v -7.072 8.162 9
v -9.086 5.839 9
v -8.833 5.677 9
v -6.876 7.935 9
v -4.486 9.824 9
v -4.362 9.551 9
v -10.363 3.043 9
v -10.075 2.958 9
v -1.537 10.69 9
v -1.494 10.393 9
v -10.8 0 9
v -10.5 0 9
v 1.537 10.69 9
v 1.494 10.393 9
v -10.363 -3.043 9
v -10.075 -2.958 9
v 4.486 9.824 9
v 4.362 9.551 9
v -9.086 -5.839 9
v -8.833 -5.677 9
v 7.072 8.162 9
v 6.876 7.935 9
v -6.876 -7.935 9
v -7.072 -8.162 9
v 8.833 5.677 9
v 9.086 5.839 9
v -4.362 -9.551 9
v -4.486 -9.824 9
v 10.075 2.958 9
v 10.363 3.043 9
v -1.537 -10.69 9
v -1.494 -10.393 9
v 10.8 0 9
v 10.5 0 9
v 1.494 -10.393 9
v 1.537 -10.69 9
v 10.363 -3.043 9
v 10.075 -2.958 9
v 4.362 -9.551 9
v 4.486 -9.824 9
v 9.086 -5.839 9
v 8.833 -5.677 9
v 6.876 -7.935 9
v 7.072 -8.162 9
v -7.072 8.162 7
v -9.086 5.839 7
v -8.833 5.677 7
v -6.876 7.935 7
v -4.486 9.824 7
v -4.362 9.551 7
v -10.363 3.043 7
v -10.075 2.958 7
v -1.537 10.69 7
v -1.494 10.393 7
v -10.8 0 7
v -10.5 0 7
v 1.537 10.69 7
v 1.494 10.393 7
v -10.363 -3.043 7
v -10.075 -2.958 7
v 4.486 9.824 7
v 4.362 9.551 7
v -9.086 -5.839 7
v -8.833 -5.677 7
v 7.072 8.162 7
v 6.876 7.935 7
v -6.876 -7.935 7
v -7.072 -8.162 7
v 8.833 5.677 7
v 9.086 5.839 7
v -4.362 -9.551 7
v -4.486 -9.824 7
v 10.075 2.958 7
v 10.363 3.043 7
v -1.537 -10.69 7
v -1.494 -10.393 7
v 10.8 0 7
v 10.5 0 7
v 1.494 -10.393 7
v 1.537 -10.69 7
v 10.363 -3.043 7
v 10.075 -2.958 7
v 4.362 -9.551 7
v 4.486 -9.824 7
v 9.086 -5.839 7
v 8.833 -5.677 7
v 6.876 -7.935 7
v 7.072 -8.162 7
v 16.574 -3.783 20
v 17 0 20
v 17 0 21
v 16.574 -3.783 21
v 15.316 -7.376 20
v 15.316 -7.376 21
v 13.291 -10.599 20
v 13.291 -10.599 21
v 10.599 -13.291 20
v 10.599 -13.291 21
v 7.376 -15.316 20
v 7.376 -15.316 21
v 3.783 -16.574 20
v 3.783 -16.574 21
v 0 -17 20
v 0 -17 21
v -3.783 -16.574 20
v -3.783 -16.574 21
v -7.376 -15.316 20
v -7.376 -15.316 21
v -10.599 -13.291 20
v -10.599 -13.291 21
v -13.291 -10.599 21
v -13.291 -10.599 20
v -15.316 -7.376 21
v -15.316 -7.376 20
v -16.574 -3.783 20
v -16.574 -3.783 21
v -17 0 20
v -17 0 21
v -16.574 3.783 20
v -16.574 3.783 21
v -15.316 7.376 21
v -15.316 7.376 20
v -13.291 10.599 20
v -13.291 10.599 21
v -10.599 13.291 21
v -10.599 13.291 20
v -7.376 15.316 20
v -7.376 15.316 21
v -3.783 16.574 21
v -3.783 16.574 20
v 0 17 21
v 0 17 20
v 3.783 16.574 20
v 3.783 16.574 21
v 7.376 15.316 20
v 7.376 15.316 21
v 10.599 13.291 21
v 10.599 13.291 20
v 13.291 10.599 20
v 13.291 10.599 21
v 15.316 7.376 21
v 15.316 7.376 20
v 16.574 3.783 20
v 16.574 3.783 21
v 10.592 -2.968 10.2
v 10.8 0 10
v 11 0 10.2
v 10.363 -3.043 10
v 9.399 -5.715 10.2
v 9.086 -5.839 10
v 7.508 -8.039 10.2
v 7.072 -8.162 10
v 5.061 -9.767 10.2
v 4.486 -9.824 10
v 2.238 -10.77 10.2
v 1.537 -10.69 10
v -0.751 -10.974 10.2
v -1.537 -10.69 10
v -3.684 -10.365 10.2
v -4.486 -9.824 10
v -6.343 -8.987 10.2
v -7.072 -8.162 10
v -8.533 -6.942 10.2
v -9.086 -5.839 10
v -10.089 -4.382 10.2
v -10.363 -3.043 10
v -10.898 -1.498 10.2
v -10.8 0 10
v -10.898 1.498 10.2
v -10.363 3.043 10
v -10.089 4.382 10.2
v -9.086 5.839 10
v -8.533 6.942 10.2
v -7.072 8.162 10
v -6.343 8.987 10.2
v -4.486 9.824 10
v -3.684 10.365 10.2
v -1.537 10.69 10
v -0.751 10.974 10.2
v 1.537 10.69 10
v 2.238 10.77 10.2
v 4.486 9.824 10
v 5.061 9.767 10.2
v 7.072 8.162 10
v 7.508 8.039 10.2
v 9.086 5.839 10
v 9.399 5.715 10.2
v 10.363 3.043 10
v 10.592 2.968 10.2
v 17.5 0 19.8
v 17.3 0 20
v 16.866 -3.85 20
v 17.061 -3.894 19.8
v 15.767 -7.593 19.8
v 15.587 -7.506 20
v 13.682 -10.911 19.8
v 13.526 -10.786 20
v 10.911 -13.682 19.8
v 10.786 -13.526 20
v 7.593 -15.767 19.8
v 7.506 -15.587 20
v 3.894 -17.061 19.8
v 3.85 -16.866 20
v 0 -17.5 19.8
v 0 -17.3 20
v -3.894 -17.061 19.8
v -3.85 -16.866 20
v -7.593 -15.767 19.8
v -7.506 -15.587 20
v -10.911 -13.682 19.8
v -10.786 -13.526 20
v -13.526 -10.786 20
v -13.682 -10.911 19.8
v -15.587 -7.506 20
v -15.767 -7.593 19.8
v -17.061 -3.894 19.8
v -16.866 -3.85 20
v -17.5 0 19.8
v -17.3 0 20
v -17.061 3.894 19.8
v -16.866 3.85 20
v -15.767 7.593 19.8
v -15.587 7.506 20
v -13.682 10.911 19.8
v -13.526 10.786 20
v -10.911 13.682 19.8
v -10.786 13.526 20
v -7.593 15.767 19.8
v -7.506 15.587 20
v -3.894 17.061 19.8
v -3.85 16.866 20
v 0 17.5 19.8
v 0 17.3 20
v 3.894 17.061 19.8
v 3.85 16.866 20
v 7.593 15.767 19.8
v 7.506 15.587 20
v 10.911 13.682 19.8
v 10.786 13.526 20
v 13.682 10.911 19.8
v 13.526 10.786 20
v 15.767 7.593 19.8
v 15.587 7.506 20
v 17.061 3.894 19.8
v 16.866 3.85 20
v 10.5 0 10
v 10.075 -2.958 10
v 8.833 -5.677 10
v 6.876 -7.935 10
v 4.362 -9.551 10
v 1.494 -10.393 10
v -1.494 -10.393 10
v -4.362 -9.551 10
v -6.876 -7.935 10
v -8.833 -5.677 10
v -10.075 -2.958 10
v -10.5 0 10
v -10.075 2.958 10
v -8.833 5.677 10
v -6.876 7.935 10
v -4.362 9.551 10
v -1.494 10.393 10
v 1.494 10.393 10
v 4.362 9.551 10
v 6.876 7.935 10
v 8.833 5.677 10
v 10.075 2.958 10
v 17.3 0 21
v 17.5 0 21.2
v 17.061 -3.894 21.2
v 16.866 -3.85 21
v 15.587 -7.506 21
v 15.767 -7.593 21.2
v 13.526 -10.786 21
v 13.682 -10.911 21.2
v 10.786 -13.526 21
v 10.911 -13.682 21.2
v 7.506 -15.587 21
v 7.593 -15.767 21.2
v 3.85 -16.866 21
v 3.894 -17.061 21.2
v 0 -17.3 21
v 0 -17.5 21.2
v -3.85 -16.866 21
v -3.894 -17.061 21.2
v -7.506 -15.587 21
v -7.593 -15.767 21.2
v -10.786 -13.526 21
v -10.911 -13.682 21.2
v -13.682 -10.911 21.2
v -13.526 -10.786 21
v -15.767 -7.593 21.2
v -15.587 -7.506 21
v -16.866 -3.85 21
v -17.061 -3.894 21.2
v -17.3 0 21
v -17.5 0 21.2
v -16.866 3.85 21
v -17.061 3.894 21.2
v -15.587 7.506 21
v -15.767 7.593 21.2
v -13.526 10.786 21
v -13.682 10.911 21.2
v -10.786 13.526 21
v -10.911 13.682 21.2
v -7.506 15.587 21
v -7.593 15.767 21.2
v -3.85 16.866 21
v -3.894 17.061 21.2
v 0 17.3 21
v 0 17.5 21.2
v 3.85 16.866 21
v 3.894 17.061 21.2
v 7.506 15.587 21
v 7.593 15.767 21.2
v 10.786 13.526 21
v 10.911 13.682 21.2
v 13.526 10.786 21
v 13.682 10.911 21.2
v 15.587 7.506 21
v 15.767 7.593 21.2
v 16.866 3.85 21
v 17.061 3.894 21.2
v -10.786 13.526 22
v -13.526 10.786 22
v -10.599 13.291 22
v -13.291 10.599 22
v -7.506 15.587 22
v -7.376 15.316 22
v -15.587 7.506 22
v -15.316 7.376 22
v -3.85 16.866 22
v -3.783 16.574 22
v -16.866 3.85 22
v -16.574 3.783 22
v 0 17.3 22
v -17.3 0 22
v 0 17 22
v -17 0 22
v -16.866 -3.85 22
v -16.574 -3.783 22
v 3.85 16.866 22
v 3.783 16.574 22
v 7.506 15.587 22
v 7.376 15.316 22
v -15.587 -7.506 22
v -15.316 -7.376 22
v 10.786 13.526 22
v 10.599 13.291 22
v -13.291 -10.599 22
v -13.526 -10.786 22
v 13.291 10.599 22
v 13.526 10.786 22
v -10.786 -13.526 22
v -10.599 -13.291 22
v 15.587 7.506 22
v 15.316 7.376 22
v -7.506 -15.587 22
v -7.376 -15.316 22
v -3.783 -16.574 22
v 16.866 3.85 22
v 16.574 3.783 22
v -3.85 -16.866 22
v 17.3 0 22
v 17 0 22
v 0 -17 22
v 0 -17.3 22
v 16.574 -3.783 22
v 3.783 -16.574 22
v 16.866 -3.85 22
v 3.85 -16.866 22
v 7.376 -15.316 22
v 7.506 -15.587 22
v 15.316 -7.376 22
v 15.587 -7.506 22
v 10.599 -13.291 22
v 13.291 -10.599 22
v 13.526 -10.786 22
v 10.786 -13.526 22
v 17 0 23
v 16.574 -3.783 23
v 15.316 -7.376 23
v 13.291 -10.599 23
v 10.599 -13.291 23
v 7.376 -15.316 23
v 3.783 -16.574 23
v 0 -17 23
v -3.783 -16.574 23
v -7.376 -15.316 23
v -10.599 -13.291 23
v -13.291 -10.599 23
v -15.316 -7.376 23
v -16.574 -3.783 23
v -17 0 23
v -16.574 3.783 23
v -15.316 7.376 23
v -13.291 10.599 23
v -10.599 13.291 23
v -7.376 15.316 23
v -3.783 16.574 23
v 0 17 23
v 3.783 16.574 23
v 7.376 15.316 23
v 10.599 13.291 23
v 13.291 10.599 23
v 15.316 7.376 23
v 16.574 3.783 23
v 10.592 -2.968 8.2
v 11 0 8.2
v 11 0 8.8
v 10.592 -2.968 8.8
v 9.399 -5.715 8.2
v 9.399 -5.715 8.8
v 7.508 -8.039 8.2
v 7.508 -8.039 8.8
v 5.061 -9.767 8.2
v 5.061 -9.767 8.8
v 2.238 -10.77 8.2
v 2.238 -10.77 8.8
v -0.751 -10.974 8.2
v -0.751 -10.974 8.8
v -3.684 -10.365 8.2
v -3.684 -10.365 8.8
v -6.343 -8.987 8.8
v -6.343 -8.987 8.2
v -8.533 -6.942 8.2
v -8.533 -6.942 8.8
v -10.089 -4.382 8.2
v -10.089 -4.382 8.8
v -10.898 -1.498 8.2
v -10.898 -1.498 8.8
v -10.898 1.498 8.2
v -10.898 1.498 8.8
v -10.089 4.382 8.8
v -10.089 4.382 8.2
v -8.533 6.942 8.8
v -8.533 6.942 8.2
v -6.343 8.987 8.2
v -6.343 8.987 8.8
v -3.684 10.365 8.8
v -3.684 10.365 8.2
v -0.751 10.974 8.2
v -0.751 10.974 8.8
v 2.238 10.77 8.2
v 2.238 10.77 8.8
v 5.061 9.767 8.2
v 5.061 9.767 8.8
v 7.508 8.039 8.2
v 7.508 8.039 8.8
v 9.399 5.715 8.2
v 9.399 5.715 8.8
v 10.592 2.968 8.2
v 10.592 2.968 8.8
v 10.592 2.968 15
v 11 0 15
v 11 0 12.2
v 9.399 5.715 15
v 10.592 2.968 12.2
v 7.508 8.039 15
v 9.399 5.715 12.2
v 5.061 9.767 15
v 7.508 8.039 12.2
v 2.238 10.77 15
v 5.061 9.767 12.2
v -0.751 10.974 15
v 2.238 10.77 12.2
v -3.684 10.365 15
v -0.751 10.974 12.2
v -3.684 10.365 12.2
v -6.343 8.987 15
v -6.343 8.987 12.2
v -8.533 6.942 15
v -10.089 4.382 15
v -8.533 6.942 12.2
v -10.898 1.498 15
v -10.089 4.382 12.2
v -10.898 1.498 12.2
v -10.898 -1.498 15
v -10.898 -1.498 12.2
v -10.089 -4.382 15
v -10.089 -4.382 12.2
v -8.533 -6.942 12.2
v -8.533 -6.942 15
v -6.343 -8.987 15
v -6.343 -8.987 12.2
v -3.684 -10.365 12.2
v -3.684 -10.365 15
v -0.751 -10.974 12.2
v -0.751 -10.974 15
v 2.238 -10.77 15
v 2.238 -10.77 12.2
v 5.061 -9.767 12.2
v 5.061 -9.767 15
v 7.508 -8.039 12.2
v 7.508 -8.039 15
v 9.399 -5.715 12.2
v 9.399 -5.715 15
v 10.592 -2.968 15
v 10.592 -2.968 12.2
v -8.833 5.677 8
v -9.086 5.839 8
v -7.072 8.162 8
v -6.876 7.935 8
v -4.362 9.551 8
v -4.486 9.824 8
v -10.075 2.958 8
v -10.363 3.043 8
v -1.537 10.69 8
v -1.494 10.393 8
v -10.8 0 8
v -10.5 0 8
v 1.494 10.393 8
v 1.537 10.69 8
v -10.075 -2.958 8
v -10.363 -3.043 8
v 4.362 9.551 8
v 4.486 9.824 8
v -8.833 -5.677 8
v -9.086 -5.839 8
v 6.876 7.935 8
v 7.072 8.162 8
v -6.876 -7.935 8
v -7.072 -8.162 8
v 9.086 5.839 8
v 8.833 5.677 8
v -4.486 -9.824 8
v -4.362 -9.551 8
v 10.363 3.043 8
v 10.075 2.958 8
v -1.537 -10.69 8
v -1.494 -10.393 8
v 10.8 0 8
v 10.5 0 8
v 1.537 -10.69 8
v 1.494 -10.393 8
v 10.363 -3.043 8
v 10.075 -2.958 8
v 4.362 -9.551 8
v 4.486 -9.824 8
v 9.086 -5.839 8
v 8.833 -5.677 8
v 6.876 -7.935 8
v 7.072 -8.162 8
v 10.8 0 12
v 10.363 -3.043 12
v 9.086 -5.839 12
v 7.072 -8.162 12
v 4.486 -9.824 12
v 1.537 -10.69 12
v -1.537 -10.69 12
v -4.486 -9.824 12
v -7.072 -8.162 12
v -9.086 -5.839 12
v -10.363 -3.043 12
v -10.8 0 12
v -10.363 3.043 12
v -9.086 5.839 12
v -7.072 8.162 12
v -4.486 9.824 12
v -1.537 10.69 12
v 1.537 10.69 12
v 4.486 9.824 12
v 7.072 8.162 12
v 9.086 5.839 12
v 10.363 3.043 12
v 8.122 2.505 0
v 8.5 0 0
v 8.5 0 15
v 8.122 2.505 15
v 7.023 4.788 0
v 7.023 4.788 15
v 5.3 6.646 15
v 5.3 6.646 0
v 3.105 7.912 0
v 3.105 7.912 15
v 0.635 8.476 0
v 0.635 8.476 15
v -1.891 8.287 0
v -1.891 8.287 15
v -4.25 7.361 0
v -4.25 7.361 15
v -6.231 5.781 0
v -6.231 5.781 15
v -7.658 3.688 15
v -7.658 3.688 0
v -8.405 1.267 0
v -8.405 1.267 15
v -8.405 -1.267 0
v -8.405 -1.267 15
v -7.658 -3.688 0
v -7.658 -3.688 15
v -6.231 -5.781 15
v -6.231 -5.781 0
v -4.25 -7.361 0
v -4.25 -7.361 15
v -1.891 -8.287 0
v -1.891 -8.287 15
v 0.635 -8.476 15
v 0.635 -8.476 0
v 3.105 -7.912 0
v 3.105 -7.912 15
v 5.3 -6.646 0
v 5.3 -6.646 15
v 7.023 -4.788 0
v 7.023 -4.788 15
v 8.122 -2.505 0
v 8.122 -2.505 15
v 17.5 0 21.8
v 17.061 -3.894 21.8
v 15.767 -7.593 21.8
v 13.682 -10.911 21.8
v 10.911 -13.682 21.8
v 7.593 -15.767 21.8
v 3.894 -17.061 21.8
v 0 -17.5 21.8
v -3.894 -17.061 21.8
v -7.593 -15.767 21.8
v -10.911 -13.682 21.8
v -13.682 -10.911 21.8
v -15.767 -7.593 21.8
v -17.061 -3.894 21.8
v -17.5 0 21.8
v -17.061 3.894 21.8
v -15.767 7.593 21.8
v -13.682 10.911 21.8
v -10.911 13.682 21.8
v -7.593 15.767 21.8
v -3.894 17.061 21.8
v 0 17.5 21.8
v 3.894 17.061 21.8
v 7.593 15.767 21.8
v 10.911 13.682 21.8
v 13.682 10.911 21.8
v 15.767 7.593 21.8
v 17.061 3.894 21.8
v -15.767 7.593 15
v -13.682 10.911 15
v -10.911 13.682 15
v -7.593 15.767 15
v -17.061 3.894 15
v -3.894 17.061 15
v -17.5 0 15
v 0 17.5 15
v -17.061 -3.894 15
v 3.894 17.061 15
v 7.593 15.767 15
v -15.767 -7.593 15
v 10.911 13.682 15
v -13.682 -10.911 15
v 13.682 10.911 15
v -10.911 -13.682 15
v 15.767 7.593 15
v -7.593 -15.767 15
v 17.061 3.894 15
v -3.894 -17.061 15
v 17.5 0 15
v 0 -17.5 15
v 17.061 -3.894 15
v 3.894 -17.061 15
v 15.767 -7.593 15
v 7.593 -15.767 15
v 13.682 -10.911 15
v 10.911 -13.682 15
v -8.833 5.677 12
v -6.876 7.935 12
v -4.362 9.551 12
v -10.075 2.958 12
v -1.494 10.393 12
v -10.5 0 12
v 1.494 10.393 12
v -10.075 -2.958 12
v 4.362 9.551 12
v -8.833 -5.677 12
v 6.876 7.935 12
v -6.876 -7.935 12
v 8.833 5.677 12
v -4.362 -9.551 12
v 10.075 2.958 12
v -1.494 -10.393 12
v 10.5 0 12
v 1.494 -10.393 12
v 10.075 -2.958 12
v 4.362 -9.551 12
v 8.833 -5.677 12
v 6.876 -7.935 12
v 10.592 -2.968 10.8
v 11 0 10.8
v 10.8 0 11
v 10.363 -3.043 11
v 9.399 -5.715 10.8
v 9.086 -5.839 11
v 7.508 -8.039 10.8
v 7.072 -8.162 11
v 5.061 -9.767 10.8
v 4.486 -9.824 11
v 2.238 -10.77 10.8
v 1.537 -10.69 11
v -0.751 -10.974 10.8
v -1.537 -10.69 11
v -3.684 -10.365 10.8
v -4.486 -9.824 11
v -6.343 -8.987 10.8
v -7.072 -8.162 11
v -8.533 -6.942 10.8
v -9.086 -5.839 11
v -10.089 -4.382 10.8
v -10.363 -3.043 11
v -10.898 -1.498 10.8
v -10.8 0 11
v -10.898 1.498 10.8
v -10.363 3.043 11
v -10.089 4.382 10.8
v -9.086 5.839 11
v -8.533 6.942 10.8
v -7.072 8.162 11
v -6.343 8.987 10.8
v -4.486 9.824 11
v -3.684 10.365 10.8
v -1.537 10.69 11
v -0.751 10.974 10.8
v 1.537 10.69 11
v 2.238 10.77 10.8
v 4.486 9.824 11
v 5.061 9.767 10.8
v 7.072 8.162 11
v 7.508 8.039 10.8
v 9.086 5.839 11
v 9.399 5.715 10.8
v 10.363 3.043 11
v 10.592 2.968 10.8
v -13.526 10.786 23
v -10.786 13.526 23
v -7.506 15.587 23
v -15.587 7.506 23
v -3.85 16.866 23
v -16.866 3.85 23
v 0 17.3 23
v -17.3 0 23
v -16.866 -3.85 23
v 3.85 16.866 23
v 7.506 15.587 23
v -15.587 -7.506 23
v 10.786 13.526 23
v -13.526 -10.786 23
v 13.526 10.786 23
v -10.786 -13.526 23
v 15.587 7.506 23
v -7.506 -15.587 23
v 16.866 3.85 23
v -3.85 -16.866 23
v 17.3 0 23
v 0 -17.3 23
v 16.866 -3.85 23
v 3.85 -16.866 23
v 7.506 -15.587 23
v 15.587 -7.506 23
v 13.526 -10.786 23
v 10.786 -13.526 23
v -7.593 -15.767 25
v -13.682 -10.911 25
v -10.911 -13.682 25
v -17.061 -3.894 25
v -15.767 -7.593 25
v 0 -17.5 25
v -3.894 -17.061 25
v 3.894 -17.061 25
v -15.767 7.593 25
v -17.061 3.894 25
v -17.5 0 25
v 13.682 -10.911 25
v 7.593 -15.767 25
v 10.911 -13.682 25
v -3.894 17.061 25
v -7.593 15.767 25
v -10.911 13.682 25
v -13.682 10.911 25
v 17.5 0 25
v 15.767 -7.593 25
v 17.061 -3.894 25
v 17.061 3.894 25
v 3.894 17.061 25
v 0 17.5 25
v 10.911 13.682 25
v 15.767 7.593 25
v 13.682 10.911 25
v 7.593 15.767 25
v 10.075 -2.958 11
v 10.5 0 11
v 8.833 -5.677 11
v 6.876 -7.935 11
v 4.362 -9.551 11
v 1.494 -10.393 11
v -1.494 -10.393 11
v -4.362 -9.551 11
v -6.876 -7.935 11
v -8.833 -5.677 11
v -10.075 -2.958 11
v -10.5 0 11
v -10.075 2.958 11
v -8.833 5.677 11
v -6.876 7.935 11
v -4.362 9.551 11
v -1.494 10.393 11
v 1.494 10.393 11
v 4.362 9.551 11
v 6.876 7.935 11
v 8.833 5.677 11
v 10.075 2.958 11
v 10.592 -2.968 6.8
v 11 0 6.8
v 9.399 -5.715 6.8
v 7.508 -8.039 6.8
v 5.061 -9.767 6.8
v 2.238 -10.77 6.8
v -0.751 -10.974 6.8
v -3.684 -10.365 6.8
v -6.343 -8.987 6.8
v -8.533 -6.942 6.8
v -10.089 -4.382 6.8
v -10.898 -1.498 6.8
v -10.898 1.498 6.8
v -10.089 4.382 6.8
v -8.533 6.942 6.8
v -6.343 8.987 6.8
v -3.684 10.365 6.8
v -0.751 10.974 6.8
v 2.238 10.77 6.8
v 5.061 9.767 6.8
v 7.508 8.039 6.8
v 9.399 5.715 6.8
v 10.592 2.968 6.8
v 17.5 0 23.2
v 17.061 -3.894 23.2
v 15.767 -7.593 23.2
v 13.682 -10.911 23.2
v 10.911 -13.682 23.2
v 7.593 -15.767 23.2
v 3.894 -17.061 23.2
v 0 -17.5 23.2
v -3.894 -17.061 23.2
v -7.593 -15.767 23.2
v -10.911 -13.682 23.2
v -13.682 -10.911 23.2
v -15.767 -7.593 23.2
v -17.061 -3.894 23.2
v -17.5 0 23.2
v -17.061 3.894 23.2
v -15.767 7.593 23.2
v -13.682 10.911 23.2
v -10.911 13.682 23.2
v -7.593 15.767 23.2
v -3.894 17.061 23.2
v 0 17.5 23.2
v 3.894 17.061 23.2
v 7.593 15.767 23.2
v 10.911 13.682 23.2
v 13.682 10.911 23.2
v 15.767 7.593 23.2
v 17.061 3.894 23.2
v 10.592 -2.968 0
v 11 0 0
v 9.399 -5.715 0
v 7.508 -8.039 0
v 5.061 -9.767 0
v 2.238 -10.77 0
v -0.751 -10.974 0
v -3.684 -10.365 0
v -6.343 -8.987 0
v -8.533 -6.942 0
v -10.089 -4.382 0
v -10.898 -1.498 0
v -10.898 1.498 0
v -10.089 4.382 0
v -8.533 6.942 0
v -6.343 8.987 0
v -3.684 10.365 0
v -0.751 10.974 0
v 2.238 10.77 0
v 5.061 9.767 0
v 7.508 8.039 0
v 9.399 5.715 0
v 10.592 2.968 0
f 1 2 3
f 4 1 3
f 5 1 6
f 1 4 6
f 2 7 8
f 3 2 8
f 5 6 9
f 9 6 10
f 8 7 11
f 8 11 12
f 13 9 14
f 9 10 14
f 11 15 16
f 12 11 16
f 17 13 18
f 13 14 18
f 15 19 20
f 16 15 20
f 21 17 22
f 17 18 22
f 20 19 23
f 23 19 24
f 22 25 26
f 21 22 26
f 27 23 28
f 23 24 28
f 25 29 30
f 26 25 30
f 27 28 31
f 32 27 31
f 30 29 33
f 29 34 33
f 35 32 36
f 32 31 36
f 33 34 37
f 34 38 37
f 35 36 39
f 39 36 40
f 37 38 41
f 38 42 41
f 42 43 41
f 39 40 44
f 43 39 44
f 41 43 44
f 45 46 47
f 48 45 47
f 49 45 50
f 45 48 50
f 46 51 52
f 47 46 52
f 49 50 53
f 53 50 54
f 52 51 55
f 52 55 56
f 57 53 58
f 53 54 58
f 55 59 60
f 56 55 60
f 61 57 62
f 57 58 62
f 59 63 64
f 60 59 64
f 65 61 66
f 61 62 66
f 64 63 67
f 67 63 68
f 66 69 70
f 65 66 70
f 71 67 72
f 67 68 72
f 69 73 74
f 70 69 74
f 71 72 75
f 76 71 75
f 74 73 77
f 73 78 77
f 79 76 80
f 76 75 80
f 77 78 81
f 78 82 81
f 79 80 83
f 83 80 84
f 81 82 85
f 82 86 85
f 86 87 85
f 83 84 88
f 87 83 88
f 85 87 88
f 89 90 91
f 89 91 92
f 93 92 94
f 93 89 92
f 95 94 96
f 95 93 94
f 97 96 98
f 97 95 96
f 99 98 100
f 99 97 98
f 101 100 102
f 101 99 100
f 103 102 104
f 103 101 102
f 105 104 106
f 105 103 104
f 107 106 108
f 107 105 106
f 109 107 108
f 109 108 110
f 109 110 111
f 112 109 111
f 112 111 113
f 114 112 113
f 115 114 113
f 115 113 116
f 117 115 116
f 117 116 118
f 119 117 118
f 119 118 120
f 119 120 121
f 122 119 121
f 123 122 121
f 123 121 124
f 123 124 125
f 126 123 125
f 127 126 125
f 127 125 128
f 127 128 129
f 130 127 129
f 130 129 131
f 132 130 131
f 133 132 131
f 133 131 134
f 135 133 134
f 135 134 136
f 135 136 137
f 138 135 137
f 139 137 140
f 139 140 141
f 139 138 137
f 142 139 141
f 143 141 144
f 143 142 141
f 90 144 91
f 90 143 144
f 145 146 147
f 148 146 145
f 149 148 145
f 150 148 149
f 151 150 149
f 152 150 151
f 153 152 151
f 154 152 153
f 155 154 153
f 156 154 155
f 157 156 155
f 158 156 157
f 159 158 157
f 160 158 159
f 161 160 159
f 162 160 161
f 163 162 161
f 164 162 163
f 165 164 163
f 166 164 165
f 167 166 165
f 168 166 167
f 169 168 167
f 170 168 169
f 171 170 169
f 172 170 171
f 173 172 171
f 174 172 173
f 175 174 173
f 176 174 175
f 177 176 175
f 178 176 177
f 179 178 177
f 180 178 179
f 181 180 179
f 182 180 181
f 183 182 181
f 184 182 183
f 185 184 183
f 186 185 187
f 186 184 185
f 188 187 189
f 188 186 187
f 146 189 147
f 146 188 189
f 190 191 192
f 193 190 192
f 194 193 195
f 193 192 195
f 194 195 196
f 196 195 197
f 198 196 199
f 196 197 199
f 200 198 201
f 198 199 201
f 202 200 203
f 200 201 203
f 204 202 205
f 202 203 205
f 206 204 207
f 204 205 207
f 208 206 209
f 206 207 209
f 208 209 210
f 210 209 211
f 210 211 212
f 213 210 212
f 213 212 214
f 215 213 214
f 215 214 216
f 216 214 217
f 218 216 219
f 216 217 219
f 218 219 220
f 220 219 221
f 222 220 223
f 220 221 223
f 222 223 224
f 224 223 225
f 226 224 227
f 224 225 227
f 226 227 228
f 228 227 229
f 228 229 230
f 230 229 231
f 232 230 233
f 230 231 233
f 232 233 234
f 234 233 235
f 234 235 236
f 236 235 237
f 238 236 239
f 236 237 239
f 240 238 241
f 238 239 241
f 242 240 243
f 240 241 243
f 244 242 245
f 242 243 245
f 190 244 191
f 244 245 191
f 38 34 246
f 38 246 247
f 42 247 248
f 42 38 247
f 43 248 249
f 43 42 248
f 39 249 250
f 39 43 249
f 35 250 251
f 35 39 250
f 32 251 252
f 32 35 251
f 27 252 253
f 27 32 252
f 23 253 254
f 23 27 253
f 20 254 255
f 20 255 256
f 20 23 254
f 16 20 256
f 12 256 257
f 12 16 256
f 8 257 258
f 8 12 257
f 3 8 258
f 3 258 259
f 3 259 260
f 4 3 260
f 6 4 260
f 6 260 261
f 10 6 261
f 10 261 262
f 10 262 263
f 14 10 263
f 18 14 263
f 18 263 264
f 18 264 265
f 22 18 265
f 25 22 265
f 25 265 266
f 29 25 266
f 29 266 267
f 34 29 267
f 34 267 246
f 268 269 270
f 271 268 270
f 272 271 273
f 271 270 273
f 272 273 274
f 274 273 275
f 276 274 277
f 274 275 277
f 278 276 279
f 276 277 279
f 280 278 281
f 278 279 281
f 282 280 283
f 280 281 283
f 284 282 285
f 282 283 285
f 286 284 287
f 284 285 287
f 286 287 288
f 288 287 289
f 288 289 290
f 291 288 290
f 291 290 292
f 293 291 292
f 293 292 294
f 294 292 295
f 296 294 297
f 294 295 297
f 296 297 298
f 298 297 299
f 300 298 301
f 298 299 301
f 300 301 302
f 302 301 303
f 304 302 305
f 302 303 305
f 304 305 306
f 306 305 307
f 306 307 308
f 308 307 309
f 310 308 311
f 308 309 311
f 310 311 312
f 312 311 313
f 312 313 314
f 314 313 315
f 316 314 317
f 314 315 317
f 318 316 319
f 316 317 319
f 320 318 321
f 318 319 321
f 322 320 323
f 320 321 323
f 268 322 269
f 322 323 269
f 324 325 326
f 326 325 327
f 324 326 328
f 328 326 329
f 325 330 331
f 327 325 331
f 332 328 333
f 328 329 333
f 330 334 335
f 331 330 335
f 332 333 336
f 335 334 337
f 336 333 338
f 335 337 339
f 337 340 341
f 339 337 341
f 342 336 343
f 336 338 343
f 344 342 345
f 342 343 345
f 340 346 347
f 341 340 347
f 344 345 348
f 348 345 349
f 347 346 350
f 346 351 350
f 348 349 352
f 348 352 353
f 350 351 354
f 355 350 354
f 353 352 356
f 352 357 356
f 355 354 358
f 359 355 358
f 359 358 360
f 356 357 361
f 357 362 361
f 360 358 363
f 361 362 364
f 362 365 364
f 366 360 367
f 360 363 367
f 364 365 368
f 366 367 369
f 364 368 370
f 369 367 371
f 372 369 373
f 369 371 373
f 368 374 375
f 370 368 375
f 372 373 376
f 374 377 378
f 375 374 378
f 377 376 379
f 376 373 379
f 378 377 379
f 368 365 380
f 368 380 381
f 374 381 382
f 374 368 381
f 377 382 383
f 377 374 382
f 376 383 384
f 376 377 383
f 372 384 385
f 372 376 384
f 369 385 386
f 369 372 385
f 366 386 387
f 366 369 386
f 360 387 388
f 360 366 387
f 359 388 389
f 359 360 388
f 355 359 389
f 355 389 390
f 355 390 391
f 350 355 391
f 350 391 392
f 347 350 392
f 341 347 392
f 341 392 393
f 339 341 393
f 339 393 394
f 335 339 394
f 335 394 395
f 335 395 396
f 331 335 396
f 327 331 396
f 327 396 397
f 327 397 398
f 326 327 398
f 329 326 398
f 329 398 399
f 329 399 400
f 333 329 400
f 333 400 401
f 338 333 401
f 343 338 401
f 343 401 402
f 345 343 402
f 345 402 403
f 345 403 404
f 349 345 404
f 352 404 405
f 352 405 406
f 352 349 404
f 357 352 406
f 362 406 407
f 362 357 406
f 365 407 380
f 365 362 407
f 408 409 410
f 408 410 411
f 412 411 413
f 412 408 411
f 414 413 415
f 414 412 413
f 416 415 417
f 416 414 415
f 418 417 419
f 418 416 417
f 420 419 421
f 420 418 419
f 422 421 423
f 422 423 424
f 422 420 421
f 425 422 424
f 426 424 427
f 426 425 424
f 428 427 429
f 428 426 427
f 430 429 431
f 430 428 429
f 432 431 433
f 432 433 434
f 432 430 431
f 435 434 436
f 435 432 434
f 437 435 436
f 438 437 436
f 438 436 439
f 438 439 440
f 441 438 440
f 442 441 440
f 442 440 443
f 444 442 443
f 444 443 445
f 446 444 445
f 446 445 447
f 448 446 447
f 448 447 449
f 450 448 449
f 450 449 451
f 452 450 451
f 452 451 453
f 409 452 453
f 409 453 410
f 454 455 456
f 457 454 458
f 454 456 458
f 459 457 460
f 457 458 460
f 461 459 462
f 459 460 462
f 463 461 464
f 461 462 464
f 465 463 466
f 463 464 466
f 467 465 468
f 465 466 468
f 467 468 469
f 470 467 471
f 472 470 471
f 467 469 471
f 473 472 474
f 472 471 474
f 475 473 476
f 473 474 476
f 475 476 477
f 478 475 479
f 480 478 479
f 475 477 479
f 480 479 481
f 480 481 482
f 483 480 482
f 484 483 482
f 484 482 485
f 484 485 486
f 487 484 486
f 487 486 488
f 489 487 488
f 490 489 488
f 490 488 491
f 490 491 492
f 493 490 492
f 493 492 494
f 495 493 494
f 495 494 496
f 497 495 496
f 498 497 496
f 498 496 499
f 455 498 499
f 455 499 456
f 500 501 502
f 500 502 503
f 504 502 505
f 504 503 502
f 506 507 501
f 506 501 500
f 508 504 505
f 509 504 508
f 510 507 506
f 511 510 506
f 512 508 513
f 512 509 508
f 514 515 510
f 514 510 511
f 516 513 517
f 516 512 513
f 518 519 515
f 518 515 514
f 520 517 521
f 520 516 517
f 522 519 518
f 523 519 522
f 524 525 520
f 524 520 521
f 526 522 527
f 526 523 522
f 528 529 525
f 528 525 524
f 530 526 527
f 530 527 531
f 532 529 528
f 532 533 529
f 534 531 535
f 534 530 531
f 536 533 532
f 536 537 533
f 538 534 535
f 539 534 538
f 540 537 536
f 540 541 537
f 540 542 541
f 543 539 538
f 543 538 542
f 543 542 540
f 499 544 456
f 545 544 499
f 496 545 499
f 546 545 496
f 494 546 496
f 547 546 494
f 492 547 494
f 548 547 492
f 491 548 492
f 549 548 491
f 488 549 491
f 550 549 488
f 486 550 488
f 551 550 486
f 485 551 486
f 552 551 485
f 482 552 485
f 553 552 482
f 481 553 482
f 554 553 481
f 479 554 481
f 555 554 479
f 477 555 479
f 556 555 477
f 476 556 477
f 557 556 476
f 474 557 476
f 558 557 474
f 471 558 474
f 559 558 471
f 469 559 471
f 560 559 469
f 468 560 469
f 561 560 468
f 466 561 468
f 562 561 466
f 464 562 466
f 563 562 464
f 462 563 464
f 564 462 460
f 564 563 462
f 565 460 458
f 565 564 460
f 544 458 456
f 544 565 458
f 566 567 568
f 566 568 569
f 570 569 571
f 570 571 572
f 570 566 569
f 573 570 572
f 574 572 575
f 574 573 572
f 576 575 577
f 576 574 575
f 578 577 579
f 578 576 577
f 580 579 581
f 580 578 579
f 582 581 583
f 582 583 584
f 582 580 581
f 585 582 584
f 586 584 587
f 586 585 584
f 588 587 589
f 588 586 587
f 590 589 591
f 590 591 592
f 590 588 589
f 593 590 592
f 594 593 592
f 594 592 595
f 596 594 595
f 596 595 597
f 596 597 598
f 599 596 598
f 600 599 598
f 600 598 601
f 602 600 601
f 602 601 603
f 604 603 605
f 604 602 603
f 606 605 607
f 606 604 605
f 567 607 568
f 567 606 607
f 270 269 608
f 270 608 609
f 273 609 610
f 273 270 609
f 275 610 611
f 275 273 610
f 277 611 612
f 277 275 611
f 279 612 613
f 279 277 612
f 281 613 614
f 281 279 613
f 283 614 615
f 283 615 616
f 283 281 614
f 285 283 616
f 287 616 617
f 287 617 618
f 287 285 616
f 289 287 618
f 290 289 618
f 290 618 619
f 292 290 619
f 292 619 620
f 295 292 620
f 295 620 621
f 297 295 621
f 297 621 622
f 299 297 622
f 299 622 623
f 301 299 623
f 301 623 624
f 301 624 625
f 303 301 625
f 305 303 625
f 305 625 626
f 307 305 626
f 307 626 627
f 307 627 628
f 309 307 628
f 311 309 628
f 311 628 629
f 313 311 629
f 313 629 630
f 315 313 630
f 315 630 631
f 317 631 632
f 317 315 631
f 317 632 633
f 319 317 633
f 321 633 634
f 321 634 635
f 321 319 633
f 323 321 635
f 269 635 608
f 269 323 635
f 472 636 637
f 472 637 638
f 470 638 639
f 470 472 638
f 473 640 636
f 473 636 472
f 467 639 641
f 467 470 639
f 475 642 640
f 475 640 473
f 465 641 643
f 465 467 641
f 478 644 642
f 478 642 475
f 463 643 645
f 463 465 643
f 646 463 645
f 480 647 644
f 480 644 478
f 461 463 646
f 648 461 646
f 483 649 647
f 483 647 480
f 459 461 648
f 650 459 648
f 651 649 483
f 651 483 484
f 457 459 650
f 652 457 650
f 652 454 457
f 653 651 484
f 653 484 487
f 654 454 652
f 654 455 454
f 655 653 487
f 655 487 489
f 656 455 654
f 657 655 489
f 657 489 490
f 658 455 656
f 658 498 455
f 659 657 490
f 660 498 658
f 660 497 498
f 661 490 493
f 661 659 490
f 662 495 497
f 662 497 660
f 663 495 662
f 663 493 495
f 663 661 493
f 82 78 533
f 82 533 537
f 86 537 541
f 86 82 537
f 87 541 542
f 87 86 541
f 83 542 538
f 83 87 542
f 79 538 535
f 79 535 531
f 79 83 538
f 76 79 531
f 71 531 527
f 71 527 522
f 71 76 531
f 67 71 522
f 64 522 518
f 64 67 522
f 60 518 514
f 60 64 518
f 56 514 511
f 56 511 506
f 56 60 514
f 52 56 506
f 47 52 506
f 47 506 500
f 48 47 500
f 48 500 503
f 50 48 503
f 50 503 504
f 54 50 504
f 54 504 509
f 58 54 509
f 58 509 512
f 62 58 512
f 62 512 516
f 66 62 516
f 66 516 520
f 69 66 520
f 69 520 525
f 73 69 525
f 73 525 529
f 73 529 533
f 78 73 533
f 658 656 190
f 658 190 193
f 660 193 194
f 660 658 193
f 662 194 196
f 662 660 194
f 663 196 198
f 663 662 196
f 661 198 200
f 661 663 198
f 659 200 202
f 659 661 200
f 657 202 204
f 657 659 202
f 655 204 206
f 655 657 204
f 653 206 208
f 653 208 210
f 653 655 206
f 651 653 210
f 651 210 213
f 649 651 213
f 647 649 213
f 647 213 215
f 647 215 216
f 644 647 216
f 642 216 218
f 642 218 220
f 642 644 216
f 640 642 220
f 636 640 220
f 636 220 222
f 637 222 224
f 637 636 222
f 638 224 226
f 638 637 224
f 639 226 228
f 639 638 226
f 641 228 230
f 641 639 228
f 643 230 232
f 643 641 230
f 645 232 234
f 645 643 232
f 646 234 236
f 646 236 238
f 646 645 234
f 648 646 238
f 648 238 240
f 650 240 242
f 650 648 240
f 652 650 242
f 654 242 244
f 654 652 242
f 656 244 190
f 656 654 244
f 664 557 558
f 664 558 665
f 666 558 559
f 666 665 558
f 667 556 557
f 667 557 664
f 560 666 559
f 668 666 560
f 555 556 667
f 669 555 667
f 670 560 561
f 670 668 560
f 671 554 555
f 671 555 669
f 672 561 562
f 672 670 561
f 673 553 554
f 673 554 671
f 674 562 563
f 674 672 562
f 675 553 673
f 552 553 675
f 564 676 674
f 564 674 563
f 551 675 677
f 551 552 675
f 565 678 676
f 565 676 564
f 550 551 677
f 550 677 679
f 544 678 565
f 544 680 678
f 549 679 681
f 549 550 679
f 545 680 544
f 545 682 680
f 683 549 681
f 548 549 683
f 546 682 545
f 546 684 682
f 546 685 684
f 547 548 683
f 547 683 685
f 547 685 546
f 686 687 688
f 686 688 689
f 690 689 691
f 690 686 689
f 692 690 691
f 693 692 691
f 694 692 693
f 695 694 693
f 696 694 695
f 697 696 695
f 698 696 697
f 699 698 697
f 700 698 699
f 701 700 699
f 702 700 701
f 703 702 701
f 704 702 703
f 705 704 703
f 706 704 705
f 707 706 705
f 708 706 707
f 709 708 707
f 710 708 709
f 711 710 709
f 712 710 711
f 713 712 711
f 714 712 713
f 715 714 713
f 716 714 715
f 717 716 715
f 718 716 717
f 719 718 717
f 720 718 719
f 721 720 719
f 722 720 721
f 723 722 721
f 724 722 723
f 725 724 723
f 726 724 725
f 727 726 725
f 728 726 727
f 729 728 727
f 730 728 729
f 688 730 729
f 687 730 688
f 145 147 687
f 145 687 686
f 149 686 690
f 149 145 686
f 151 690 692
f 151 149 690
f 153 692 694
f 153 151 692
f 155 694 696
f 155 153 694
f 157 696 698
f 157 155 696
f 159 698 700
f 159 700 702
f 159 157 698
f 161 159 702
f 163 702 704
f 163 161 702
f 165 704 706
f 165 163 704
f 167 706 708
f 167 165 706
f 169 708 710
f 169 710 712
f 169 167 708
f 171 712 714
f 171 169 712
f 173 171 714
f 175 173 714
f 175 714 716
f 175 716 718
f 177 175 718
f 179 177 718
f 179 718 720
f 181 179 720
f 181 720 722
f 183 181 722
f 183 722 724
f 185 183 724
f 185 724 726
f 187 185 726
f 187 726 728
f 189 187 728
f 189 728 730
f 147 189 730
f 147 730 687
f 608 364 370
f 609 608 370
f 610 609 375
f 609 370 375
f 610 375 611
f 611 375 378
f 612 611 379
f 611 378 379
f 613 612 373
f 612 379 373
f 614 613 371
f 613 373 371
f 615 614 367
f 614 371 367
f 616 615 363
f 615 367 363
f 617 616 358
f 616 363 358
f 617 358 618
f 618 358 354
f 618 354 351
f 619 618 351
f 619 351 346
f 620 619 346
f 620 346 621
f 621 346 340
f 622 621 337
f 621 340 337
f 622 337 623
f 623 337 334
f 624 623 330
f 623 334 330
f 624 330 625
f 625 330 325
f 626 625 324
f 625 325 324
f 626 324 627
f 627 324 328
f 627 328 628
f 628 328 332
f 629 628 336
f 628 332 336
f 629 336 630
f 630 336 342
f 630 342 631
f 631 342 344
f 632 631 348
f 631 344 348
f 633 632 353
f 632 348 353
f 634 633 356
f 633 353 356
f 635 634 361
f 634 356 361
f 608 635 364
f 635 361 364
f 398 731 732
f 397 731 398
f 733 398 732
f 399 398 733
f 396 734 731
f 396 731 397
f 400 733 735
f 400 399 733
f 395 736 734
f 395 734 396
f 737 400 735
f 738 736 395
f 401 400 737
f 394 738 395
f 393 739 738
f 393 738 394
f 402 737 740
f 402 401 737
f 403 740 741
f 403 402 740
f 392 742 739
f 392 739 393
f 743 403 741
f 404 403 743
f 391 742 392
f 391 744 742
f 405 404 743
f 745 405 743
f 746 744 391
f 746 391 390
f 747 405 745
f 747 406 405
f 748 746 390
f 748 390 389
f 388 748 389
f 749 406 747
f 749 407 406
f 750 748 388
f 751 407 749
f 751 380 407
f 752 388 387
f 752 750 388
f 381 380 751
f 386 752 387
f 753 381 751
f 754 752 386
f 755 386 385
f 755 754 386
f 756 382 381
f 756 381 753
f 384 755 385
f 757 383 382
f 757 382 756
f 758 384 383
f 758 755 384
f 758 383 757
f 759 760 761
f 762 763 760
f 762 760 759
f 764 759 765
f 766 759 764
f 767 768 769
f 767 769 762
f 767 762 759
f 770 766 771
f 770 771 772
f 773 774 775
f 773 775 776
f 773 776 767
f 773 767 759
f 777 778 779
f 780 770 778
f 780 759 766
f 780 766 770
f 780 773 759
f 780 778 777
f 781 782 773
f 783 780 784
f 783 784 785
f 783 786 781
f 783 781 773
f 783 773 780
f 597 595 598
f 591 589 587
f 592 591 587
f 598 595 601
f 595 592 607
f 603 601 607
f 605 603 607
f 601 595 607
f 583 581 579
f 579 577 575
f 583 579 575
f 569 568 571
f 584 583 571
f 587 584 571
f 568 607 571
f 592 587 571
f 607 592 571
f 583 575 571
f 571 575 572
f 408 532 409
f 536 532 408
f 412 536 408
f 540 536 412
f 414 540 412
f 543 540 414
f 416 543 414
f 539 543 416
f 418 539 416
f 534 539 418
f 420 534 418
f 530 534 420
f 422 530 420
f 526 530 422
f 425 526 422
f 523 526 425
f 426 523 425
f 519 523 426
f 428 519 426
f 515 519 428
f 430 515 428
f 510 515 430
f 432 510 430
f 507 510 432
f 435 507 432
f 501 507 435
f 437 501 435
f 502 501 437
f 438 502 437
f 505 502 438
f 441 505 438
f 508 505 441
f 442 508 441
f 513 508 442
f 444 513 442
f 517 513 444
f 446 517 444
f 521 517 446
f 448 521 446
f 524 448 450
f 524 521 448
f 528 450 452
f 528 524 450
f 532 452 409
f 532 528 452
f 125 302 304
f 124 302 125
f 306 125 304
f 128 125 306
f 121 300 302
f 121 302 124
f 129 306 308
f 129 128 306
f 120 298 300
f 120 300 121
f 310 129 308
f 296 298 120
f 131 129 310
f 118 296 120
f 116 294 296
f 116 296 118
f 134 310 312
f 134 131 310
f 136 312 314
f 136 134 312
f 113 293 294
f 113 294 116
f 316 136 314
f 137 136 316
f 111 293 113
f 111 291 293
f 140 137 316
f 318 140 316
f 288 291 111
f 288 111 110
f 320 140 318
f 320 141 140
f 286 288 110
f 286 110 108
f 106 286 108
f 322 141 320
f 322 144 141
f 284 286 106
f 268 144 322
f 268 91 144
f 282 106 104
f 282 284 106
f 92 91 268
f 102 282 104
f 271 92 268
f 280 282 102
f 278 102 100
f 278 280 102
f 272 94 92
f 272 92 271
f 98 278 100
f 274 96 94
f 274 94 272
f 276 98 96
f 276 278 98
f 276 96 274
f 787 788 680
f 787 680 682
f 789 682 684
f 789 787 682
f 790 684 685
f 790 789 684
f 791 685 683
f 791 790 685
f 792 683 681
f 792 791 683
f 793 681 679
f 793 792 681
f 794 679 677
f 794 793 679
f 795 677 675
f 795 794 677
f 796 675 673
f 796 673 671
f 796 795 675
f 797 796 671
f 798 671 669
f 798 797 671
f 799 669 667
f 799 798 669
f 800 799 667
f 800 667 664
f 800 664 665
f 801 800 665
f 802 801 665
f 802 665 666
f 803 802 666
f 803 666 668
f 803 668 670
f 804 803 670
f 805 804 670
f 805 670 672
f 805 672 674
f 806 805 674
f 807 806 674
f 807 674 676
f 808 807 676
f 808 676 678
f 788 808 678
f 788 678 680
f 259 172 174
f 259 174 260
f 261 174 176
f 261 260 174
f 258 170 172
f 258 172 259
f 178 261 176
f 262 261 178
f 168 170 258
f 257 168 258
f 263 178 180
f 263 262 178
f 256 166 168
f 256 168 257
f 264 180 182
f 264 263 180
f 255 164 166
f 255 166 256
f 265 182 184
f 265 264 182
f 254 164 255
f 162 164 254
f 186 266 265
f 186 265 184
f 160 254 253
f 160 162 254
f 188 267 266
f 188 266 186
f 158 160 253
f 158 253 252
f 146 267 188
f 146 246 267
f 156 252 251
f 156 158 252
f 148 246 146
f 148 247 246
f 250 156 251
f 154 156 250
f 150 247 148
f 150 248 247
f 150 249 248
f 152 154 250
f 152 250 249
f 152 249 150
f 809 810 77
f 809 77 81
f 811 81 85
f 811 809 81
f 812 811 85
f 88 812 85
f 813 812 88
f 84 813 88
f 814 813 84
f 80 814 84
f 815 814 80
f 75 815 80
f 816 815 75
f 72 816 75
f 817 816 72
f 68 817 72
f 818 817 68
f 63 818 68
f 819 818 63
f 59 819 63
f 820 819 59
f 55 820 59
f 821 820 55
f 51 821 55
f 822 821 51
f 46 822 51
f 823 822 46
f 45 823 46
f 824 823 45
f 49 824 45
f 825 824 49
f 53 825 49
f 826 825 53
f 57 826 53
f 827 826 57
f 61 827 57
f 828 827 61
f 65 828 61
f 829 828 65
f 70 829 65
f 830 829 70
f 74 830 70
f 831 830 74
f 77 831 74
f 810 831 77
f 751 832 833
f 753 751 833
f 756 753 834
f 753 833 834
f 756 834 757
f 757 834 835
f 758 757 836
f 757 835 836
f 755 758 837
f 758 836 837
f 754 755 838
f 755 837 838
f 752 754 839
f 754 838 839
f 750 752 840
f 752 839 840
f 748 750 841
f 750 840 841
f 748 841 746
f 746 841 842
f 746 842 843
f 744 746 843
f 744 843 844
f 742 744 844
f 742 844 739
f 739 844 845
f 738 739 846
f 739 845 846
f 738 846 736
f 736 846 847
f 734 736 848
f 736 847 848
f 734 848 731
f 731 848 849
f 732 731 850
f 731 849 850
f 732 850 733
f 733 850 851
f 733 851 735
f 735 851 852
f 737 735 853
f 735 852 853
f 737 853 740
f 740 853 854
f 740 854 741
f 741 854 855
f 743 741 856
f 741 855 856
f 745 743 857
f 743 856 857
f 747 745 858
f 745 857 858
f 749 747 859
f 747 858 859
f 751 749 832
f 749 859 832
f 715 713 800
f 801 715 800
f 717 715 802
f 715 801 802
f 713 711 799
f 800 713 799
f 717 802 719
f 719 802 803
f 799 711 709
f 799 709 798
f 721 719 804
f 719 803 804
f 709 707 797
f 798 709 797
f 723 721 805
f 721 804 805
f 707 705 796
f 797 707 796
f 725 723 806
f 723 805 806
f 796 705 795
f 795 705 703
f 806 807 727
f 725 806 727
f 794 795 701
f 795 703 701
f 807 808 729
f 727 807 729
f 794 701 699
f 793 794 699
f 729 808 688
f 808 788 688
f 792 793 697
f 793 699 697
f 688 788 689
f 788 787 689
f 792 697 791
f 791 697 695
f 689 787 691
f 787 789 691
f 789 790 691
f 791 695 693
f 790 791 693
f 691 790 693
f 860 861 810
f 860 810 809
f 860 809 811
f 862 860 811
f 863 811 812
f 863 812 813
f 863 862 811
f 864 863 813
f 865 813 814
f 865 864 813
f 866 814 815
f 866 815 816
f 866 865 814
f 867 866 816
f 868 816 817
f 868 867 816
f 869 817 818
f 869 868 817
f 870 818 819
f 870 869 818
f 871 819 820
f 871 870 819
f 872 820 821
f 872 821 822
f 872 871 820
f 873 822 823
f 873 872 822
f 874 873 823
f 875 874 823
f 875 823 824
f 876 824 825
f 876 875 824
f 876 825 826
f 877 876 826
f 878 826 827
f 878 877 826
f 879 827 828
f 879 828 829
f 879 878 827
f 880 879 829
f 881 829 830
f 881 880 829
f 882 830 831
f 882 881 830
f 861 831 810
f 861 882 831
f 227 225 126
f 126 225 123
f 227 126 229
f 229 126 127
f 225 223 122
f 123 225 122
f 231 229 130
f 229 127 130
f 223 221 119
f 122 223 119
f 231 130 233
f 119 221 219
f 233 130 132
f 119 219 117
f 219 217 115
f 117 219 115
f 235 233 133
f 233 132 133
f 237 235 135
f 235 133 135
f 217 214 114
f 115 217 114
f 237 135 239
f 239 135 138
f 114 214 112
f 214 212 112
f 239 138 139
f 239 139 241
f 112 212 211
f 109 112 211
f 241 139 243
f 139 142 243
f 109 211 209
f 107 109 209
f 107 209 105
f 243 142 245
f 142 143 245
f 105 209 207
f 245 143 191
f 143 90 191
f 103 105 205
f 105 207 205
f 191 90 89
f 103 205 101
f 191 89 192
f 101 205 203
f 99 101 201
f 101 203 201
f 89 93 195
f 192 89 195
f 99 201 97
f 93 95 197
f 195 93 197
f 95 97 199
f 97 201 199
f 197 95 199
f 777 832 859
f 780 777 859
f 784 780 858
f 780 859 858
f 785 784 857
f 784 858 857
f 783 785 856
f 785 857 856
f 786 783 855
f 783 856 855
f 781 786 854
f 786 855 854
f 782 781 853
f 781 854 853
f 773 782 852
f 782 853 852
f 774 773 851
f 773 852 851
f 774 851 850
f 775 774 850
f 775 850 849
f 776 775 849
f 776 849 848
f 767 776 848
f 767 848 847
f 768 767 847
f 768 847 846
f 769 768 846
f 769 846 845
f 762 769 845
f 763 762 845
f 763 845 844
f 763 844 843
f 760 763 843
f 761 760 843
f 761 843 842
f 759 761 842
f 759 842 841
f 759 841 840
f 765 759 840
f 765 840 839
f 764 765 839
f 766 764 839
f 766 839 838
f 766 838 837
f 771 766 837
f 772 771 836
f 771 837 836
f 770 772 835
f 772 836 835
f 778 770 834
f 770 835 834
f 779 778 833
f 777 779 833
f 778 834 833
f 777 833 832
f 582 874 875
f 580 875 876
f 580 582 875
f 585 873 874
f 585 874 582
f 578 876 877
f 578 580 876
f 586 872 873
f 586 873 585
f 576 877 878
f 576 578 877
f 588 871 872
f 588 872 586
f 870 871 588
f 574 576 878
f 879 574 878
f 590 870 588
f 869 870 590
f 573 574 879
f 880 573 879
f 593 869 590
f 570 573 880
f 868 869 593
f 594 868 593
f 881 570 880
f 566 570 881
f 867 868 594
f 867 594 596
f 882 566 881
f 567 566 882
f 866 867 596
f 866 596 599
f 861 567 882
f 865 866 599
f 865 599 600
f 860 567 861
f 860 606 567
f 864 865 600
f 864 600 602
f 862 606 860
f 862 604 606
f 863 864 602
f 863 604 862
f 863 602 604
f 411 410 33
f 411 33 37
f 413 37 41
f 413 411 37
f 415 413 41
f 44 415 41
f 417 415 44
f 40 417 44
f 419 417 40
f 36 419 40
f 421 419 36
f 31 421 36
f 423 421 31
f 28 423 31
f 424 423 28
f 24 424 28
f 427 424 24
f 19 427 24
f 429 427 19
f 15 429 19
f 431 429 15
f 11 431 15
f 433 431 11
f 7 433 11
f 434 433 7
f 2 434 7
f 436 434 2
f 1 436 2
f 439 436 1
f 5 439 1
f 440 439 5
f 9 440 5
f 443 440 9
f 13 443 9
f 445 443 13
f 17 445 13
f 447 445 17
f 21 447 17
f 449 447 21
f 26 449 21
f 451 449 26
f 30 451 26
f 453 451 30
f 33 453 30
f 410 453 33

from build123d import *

# Parameters (mm, degrees)
F0_R      = 11
F0_R_2    = 8.5
F1_DEPTH  = 15
F2_R      = 17.5
F3_DEPTH  = 10
F4_R      = 11
F4_R_2    = 10.5
F5_DEPTH  = 12
F6_R      = 11
F6_R_2    = 10.5
F7_DEPTH  = 11
F8_R      = 11
F8_R_2    = 10.5
F9_DEPTH  = 10
F10_R     = 11
F10_R_2   = 10.5
F11_DEPTH = 9
F12_R     = 11
F12_R_2   = 10.5
F13_DEPTH = 8
F14_R     = 11
F14_R_2   = 10.5
F15_DEPTH = 7
F16_R     = 17.5
F16_R_2   = 17
F17_DEPTH = 8
F18_R     = 17.5
F18_R_2   = 17
F19_DEPTH = 7
F20_R     = 17.5
F20_R_2   = 17
F21_DEPTH = 6
F22_R     = 17.5
F22_R_2   = 17
F23_DEPTH = 5
F24_SIZE  = 0.2


with BuildPart() as f1:
    # F0 (on Top) → F1 (new body)
    with BuildSketch(Plane.XY):
        Circle(F0_R)
        Circle(F0_R_2, mode=Mode.SUBTRACT)
    extrude(amount=F1_DEPTH)

    # F2 (on face) → F3 (join)
    with BuildSketch(Plane.XY.offset(15)):
        Circle(F2_R)
    extrude(amount=F3_DEPTH)

    # F4 (on face) → F5 (cut)
    with BuildSketch(Plane(origin=(0, 0, 0), x_dir=(1, 0, 0), z_dir=(0, 0, -1))):
        Circle(F4_R)
        Circle(F4_R_2, mode=Mode.SUBTRACT)
    extrude(amount=-F5_DEPTH, mode=Mode.SUBTRACT)

    # F6 (on face) → F7 (join)
    with BuildSketch(Plane(origin=(0, 0, 0), x_dir=(1, 0, 0), z_dir=(0, 0, -1))):
        Circle(F6_R)
        Circle(F6_R_2, mode=Mode.SUBTRACT)
    extrude(amount=-F7_DEPTH)

    # F8 (on face) → F9 (cut)
    with BuildSketch(Plane(origin=(0, 0, 0), x_dir=(1, 0, 0), z_dir=(0, 0, -1))):
        Circle(F8_R)
        Circle(F8_R_2, mode=Mode.SUBTRACT)
    extrude(amount=-F9_DEPTH, mode=Mode.SUBTRACT)

    # F10 (on face) → F11 (join)
    with BuildSketch(Plane(origin=(0, 0, 0), x_dir=(1, 0, 0), z_dir=(0, 0, -1))):
        Circle(F10_R)
        Circle(F10_R_2, mode=Mode.SUBTRACT)
    extrude(amount=-F11_DEPTH)

    # F12 (on face) → F13 (cut)
    with BuildSketch(Plane(origin=(0, 0, 0), x_dir=(1, 0, 0), z_dir=(0, 0, -1))):
        Circle(F12_R)
        Circle(F12_R_2, mode=Mode.SUBTRACT)
    extrude(amount=-F13_DEPTH, mode=Mode.SUBTRACT)

    # F14 (on face) → F15 (join)
    with BuildSketch(Plane(origin=(0, 0, 0), x_dir=(1, 0, 0), z_dir=(0, 0, -1))):
        Circle(F14_R)
        Circle(F14_R_2, mode=Mode.SUBTRACT)
    extrude(amount=-F15_DEPTH)

    # F16 (on face) → F17 (cut)
    with BuildSketch(Plane(origin=(0, 0, 15), x_dir=(1, 0, 0), z_dir=(0, 0, -1))):
        Circle(F16_R)
        Circle(F16_R_2, mode=Mode.SUBTRACT)
    extrude(amount=-F17_DEPTH, mode=Mode.SUBTRACT)

    # F18 (on face) → F19 (join)
    with BuildSketch(Plane(origin=(0, 0, 15), x_dir=(1, 0, 0), z_dir=(0, 0, -1))):
        Circle(F18_R)
        Circle(F18_R_2, mode=Mode.SUBTRACT)
    extrude(amount=-F19_DEPTH)

    # F20 (on face) → F21 (cut)
    with BuildSketch(Plane(origin=(0, 0, 15), x_dir=(1, 0, 0), z_dir=(0, 0, -1))):
        Circle(F20_R)
        Circle(F20_R_2, mode=Mode.SUBTRACT)
    extrude(amount=-F21_DEPTH, mode=Mode.SUBTRACT)

    # F22 (on face) → F23 (join)
    with BuildSketch(Plane(origin=(0, 0, 15), x_dir=(1, 0, 0), z_dir=(0, 0, -1))):
        Circle(F22_R)
        Circle(F22_R_2, mode=Mode.SUBTRACT)
    extrude(amount=-F23_DEPTH)

    # F24
    f24_edges = [f1.edges().sort_by_distance(p)[0] for p in [
        (-17.5, 0, 23),
        (-17.5, 0, 22),
        (-17.5, 0, 20),
        (-17.5, 0, 21),
        (-11, 0, 12),
        (-11, 0, 10),
        (-11, 0, 11),
        (-11, 0, 9),
        (-11, 0, 8),
        (-11, 0, 7),
    ]]
    chamfer(f24_edges, length=F24_SIZE)


solid = f1.part
